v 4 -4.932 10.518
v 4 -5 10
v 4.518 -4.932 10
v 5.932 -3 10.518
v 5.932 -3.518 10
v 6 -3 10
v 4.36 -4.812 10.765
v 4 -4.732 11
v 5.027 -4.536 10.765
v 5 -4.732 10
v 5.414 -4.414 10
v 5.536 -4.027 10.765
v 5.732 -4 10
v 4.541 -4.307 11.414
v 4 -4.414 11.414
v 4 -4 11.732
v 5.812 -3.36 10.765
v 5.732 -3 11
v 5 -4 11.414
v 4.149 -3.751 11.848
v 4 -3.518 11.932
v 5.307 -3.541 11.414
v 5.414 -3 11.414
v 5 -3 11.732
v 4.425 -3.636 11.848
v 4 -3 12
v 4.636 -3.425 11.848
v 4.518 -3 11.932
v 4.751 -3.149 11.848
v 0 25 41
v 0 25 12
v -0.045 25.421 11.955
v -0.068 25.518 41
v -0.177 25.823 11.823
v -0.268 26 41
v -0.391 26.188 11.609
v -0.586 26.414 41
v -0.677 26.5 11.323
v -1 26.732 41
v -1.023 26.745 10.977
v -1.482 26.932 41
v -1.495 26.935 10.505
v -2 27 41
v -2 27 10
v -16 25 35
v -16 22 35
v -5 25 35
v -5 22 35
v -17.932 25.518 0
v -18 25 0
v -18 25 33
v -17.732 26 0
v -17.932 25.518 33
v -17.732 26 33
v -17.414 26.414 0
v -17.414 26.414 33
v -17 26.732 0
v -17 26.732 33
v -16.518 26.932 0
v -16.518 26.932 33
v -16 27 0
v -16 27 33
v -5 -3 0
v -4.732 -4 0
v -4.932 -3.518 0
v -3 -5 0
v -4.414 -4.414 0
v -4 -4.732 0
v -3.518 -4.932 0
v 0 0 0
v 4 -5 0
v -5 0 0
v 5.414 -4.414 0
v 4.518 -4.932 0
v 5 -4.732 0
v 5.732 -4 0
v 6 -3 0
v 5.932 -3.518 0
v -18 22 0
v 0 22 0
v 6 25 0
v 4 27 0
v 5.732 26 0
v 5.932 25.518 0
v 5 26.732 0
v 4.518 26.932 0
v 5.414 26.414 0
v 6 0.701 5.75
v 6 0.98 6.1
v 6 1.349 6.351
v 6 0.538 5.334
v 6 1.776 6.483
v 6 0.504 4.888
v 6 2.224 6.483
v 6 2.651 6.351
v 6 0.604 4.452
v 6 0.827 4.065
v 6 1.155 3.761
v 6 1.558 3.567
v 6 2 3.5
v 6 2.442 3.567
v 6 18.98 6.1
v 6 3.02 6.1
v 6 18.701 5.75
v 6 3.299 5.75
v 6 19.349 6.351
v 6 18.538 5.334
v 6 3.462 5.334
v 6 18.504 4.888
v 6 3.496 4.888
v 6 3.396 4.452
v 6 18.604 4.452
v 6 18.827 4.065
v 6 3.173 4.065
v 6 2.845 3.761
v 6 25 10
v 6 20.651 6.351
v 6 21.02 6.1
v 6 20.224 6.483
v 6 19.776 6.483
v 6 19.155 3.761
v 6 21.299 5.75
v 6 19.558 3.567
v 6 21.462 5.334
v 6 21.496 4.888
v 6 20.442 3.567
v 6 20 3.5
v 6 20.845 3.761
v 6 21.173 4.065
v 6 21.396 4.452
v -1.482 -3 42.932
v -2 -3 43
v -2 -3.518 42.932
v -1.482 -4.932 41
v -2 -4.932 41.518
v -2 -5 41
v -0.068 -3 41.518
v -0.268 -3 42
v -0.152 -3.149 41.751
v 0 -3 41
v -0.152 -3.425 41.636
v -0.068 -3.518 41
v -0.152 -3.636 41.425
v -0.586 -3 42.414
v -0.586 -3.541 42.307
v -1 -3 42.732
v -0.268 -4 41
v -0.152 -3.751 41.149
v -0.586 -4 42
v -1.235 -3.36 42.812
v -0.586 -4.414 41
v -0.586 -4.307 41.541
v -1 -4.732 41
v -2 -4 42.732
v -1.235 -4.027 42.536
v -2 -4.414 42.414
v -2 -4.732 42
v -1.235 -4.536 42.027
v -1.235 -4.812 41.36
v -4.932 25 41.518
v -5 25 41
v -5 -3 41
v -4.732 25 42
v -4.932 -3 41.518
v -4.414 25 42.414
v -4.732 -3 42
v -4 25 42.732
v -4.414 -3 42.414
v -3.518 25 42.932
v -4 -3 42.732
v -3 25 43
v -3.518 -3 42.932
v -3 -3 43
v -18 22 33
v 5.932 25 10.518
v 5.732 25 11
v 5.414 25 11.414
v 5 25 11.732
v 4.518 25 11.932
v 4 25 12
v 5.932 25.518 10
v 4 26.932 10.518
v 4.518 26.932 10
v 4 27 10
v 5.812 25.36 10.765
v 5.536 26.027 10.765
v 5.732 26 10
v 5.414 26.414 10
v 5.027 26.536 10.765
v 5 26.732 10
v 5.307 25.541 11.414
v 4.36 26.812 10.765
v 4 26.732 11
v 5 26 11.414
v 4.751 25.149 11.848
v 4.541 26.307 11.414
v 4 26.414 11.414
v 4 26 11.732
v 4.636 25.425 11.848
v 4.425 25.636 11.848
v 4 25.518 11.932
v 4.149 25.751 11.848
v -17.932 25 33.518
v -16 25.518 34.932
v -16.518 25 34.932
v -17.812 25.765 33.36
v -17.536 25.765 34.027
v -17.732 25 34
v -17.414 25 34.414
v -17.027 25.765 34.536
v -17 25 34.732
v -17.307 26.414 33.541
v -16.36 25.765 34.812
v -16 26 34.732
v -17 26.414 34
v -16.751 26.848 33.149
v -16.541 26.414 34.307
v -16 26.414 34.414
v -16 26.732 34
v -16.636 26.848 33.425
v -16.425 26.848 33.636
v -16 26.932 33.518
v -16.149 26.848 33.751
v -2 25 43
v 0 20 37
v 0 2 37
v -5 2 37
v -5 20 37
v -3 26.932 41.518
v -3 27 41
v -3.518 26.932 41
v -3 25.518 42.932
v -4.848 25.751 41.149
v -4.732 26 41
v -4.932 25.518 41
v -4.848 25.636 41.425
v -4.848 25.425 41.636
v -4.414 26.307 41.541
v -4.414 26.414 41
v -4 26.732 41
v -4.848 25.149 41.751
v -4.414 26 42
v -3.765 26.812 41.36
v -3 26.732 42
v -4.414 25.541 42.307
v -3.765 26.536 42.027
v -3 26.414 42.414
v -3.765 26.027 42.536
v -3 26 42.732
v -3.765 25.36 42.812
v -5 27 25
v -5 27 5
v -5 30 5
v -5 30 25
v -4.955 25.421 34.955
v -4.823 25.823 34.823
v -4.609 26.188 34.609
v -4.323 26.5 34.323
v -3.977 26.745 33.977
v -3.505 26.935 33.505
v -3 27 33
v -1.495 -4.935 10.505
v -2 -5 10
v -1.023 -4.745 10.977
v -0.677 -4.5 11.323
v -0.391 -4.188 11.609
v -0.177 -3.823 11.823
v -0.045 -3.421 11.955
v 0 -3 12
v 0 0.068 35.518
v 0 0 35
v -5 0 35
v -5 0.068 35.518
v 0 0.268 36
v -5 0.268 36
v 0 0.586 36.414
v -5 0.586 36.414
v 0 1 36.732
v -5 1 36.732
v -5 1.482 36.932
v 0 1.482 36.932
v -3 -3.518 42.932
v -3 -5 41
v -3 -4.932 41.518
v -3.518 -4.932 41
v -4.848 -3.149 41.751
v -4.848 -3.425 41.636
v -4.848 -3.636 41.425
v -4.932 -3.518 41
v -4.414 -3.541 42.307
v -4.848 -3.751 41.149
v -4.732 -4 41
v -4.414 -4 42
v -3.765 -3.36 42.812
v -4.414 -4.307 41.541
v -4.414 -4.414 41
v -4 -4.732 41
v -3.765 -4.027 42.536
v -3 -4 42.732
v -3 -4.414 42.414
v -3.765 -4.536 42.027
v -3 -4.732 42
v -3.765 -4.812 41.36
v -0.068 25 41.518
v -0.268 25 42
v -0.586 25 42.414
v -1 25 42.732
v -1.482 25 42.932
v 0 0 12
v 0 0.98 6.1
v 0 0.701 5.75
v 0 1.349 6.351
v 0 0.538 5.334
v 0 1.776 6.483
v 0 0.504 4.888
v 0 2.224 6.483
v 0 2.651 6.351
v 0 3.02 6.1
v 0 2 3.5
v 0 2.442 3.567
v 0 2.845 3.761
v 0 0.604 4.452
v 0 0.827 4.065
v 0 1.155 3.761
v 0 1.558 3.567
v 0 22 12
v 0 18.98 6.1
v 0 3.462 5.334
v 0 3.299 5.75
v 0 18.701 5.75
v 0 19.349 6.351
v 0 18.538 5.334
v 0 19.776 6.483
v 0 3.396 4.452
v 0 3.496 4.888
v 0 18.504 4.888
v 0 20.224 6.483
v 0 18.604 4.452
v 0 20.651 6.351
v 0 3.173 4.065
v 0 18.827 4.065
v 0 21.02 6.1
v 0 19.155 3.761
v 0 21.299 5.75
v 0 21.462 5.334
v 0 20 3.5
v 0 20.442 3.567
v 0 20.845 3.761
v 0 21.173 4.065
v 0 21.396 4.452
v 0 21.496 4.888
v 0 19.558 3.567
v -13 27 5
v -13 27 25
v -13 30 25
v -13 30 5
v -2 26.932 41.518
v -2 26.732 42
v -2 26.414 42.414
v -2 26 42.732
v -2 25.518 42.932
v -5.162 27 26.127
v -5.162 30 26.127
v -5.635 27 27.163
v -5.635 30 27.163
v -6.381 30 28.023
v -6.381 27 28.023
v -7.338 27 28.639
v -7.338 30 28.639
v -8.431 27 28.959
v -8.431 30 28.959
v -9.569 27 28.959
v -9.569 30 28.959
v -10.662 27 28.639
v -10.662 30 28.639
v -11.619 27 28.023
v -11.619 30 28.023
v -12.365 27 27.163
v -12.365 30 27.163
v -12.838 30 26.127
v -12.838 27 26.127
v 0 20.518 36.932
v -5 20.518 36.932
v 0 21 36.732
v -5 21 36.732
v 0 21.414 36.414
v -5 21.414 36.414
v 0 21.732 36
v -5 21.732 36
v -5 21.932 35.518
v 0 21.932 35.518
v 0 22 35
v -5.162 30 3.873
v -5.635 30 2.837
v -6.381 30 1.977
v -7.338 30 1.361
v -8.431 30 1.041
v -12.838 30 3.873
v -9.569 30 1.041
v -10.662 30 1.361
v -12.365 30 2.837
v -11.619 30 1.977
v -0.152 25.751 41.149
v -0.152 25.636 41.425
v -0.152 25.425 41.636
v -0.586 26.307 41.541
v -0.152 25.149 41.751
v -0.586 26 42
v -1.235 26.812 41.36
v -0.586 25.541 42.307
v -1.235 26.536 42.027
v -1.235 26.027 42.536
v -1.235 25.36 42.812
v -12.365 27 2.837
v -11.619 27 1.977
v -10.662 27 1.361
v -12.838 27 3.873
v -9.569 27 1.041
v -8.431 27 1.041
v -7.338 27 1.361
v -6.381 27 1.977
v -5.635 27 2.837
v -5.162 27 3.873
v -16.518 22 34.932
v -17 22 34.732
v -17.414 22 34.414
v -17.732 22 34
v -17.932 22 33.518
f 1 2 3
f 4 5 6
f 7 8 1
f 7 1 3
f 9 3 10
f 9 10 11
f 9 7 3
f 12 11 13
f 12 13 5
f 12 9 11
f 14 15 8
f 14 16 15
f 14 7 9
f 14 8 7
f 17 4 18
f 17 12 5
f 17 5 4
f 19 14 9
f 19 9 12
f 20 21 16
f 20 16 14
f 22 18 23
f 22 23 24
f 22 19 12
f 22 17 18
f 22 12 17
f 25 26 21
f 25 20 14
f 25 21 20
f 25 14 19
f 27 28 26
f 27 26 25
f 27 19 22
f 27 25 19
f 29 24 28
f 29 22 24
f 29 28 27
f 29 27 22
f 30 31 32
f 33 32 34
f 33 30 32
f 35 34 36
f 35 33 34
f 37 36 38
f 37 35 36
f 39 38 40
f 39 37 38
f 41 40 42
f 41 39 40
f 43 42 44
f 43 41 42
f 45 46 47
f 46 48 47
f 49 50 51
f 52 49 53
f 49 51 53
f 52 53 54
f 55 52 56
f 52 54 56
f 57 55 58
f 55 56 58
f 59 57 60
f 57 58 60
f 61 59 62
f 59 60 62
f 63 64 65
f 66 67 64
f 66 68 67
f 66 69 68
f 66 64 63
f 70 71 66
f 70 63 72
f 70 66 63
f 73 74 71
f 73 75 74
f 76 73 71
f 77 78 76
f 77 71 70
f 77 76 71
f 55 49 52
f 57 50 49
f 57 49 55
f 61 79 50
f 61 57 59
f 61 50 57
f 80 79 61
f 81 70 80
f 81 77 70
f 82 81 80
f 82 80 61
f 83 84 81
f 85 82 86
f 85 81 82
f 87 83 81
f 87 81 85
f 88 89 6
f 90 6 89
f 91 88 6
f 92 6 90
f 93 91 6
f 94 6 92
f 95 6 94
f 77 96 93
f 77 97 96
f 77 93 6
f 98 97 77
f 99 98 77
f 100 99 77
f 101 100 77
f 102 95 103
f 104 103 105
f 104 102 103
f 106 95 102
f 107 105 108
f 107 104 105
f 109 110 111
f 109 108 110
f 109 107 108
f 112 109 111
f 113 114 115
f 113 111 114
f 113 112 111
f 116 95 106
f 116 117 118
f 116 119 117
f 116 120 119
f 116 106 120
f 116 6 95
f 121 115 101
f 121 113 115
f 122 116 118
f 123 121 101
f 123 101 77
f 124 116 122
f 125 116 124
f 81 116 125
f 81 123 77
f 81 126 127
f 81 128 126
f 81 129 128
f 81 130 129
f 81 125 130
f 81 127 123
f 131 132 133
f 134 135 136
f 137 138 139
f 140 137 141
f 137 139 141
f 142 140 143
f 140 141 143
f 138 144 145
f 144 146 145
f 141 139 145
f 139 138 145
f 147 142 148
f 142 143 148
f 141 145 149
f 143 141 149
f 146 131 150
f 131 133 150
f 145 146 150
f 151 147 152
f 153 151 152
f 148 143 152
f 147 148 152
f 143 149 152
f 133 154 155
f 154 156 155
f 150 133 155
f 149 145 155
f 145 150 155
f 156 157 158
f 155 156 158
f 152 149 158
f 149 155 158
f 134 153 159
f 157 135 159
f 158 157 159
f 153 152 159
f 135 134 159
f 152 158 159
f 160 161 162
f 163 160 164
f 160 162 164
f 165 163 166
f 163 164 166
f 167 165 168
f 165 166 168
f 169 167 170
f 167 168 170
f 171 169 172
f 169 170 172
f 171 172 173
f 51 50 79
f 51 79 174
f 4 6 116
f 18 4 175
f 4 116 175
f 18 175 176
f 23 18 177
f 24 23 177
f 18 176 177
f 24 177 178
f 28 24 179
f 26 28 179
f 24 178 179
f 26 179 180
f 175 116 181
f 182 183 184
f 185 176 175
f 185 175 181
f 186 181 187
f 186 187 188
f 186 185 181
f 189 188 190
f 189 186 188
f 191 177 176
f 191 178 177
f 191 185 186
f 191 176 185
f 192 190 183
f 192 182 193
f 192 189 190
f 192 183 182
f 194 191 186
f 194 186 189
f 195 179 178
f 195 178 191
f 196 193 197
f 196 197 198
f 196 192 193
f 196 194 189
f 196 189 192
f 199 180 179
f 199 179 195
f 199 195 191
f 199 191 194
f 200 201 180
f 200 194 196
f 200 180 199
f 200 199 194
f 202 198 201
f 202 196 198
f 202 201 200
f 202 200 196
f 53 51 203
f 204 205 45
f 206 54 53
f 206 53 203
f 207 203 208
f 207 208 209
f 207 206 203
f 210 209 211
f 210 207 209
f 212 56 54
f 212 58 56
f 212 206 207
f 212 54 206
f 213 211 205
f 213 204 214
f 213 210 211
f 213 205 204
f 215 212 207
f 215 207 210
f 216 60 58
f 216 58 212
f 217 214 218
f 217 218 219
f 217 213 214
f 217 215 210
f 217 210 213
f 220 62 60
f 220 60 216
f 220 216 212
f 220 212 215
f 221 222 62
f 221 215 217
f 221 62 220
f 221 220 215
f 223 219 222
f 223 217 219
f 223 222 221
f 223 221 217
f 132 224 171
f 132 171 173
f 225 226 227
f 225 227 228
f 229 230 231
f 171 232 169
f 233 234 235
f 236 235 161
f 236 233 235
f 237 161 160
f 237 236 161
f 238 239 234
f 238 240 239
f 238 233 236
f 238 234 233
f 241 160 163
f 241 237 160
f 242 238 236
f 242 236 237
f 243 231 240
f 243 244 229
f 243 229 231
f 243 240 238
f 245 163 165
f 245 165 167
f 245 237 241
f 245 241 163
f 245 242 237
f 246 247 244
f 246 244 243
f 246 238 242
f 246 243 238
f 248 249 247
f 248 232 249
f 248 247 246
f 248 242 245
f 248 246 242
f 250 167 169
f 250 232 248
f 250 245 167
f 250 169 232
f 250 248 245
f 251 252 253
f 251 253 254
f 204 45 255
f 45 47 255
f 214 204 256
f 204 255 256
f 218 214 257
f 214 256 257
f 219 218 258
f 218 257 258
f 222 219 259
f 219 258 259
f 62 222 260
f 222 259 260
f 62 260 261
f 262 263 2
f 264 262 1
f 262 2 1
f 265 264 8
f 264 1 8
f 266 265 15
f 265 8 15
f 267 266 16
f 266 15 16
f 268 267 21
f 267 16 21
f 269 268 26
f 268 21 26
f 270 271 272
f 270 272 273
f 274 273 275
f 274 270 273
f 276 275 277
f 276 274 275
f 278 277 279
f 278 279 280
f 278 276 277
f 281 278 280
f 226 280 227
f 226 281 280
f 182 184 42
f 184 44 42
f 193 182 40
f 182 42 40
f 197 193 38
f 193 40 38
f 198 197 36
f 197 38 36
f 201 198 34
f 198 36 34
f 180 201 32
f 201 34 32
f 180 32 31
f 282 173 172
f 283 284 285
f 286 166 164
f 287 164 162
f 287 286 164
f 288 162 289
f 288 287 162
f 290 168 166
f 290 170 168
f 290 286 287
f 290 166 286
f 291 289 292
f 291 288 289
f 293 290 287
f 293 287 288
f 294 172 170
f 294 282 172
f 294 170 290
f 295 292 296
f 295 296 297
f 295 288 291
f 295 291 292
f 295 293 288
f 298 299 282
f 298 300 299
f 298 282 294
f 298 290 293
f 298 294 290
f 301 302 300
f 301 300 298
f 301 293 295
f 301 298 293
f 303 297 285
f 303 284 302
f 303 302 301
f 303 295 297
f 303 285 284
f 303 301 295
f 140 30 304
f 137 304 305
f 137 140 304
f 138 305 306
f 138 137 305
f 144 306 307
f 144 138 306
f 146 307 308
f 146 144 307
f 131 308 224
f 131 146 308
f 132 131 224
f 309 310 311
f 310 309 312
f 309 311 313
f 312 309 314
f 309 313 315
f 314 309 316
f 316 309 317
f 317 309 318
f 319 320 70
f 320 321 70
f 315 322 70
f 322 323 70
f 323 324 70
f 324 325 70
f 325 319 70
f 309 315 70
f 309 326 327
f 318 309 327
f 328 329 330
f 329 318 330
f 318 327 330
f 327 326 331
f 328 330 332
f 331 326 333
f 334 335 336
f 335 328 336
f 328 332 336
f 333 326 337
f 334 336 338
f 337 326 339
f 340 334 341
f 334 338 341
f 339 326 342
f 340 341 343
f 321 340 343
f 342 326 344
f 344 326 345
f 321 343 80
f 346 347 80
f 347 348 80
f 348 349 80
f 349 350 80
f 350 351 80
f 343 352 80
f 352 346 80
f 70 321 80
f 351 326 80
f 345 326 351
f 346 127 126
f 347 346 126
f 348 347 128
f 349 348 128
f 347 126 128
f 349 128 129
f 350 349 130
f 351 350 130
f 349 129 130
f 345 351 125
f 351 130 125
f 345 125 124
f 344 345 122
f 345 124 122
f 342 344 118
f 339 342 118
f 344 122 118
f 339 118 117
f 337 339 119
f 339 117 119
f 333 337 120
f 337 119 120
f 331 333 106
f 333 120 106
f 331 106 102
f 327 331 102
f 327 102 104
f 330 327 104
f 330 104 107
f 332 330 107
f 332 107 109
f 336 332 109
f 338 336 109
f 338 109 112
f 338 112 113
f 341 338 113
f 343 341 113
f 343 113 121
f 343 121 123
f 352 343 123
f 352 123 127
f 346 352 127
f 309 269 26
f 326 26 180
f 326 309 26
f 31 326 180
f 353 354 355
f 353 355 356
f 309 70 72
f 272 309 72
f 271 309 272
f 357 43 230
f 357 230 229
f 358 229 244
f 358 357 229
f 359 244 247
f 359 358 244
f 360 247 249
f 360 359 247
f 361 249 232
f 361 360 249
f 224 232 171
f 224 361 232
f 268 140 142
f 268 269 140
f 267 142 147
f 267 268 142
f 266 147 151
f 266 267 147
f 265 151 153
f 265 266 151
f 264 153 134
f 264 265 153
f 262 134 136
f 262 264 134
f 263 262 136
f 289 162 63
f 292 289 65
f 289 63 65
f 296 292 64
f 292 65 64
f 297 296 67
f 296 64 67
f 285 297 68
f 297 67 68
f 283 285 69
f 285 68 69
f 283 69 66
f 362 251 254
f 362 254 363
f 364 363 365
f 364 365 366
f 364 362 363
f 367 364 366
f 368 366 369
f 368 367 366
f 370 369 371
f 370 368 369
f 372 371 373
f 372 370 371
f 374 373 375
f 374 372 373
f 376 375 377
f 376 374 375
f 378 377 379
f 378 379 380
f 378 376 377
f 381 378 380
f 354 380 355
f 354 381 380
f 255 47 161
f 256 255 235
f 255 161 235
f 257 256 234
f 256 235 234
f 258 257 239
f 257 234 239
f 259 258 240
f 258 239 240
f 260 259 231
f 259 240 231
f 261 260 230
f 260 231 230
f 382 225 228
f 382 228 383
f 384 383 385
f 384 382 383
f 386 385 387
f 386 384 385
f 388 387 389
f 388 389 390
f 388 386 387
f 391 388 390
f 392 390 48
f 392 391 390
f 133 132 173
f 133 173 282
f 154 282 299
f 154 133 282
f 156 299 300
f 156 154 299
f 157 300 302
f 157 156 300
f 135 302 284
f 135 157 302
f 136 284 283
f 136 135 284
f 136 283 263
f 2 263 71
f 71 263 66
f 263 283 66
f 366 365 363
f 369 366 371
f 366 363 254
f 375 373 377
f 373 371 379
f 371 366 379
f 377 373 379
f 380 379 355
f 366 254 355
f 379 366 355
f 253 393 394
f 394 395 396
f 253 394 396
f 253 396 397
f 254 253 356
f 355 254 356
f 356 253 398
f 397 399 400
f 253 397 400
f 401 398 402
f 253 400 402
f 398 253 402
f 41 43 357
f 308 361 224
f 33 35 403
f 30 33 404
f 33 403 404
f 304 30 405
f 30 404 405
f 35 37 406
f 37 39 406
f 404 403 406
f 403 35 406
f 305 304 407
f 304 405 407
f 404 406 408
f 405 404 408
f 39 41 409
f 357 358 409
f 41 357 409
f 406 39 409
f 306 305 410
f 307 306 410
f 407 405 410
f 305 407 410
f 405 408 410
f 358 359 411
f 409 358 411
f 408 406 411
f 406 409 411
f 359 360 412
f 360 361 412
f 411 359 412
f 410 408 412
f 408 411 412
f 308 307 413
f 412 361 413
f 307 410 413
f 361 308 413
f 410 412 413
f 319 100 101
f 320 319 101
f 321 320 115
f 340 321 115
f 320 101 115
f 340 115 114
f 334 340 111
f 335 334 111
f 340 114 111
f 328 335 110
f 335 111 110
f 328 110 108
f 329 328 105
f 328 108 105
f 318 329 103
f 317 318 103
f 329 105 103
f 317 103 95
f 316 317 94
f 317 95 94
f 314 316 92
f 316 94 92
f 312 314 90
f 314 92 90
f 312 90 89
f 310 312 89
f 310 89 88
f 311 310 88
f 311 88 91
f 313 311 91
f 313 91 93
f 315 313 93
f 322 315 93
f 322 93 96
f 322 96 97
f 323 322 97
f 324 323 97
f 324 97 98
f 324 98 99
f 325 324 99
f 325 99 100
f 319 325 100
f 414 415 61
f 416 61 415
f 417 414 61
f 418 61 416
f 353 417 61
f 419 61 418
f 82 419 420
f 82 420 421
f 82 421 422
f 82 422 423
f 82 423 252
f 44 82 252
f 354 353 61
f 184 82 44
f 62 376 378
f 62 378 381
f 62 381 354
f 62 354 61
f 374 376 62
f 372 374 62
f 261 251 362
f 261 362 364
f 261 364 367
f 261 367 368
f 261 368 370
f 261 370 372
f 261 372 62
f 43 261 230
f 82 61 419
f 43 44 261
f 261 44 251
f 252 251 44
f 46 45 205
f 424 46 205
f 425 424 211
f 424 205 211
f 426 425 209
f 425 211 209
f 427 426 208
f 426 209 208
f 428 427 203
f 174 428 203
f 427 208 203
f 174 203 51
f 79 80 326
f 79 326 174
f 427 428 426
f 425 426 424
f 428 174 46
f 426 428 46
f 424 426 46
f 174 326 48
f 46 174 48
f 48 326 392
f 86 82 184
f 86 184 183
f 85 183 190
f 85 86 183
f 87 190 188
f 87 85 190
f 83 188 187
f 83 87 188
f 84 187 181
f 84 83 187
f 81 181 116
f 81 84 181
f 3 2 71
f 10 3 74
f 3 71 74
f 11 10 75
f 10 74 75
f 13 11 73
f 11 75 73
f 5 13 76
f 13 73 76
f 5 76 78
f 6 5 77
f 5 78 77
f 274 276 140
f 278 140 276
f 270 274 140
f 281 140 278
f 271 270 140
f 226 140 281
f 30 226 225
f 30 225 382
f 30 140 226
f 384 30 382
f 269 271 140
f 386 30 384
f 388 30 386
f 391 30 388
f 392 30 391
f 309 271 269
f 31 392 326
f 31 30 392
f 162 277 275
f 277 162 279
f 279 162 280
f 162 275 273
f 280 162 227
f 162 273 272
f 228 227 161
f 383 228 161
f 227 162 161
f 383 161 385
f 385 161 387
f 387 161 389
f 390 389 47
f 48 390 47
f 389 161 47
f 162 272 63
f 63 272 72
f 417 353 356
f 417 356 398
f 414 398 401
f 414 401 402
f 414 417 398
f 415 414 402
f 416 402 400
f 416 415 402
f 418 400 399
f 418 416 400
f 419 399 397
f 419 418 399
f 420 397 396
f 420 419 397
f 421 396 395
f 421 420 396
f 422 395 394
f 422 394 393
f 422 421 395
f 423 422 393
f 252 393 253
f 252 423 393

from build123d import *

# Parameters (mm, degrees)
BOSS_EXTRUDE1_DEPTH = 5
SKETCH2_W           = 12
SKETCH2_H           = 32
BOSS_EXTRUDE2_DEPTH = 6
CUT_EXTRUDE1_REACH  = 53.952
AGUJEROSMOTOR_R     = 1.5
FILLET1_R           = 2
SKETCH5_W           = 35
SKETCH5_H           = 5
BOSS_EXTRUDE3_DEPTH = 13
FILLET2_R           = 2
FILLET3_R           = 2
FILLET4_R           = 2
BOSS_EXTRUDE4_DEPTH = 3


with BuildPart() as part:
    # Sketch U → Boss-Extrude1 (new body)
    with BuildSketch(Plane(origin=(0, 0, 0), x_dir=(0, 0, -1), z_dir=(1, 0, 0))):
        with BuildLine():
            Line((0, 22), (0, 27))
            Line((0, 27), (-41, 27))
            ThreePointArc((-41, 27), (-42.414213562, 26.414213562), (-43, 25))
            Line((-43, 25), (-43, -3))
            ThreePointArc((-43, -3), (-42.414213562, -4.414213562), (-41, -5))
            Line((-41, -5), (0, -5))
            Line((0, -5), (0, 0))
            Line((0, 0), (-35, 0))
            ThreePointArc((-35, 0), (-36.414213562, 0.585786438), (-37, 2))
            Line((-37, 2), (-37, 20))
            ThreePointArc((-37, 20), (-36.414213562, 21.414213562), (-35, 22))
            Line((-35, 22), (0, 22))
        make_face()
    extrude(amount=-BOSS_EXTRUDE1_DEPTH)

    # Sketch2 → Boss-Extrude2 (add)
    with BuildSketch(Plane(origin=(0, 0, 0), x_dir=(0, 0, -1), z_dir=(1, 0, 0))):
        with Locations((-6, 11)):
            Rectangle(SKETCH2_W, SKETCH2_H)
    extrude(amount=BOSS_EXTRUDE2_DEPTH)

    # AgujerosMotor → Cut-Extrude1 (cut, up to next)
    with BuildSketch(Plane(origin=(6, 0, 0), x_dir=(0, 0, -1), z_dir=(1, 0, 0)), mode=Mode.PRIVATE) as cut_extrude1_sk1:
        with Locations((-5, 2)):
            Circle(AGUJEROSMOTOR_R)
    cut_extrude1_tool1 = extrude(cut_extrude1_sk1.sketch, amount=-CUT_EXTRUDE1_REACH, mode=Mode.PRIVATE) & part.part
    # AgujerosMotor → Cut-Extrude1 (cut, up to next)
    with BuildSketch(Plane(origin=(6, 0, 0), x_dir=(0, 0, -1), z_dir=(1, 0, 0)), mode=Mode.PRIVATE) as cut_extrude1_sk2:
        with Locations((-5, 20)):
            Circle(AGUJEROSMOTOR_R)
    cut_extrude1_tool2 = extrude(cut_extrude1_sk2.sketch, amount=-CUT_EXTRUDE1_REACH, mode=Mode.PRIVATE) & part.part
    add(cut_extrude1_tool1.solids().sort_by_distance((6, 2, 5))[0], mode=Mode.SUBTRACT)
    add(cut_extrude1_tool2.solids().sort_by_distance((6, 20, 5))[0], mode=Mode.SUBTRACT)

    # Fillet1
    fillet1_edges = [part.edges().sort_by_distance(p)[0] for p in [
        (6, 27, 6),
        (6, -5, 6),
    ]]
    fillet(fillet1_edges, radius=FILLET1_R)

    # Sketch5 → Boss-Extrude3 (add)
    with BuildSketch(Plane.ZY.offset(5)):
        with Locations((17.5, 24.5)):
            Rectangle(SKETCH5_W, SKETCH5_H)
    extrude(amount=BOSS_EXTRUDE3_DEPTH)

    # Fillet2
    fillet2_edges = [part.edges().sort_by_distance(p)[0] for p in [
        (-18, 24.5, 35),
    ]]
    fillet(fillet2_edges, radius=FILLET2_R)

    # Fillet3
    fillet3_edges = [part.edges().sort_by_distance(p)[0] for p in [
        (0, -5, 26.5),
        (0, -4.414213562, 42.414213562),
        (0, 11, 43),
        (0, 26.414213562, 42.414213562),
        (0, 27, 26.5),
        (-5, 26.414213562, 42.414213562),
        (-5, 11, 43),
        (-5, -4.414213562, 42.414213562),
        (-5, -5, 20.5),
        (6, 11, 12),
        (2, -5, 12),
        (2, 27, 12),
        (5.414213562, -4.414213562, 12),
        (5.414213562, 26.414213562, 12),
        (-5, 27, 38),
    ]]
    fillet(fillet3_edges, radius=FILLET3_R)

    # Fillet4
    fillet4_edges = [part.edges().sort_by_distance(p)[0] for p in [
        (-18, 27, 16.5),
        (-17.414213562, 27, 34.414213562),
        (-9.5, 27, 35),
    ]]
    fillet(fillet4_edges, radius=FILLET4_R)

    # Encastre → Boss-Extrude4 (add)
    with BuildSketch(Plane(origin=(0, 27, 0), x_dir=(1, 0, 0), z_dir=(0, 1, 0))):
        with BuildLine():
            Line((-5, -5), (-5, -25))
            ThreePointArc((-5, -25), (-9, -29), (-13, -25))
            Line((-13, -25), (-13, -5))
            ThreePointArc((-13, -5), (-9, -1), (-5, -5))
        make_face()
    extrude(amount=BOSS_EXTRUDE4_DEPTH)


solid = part.part
